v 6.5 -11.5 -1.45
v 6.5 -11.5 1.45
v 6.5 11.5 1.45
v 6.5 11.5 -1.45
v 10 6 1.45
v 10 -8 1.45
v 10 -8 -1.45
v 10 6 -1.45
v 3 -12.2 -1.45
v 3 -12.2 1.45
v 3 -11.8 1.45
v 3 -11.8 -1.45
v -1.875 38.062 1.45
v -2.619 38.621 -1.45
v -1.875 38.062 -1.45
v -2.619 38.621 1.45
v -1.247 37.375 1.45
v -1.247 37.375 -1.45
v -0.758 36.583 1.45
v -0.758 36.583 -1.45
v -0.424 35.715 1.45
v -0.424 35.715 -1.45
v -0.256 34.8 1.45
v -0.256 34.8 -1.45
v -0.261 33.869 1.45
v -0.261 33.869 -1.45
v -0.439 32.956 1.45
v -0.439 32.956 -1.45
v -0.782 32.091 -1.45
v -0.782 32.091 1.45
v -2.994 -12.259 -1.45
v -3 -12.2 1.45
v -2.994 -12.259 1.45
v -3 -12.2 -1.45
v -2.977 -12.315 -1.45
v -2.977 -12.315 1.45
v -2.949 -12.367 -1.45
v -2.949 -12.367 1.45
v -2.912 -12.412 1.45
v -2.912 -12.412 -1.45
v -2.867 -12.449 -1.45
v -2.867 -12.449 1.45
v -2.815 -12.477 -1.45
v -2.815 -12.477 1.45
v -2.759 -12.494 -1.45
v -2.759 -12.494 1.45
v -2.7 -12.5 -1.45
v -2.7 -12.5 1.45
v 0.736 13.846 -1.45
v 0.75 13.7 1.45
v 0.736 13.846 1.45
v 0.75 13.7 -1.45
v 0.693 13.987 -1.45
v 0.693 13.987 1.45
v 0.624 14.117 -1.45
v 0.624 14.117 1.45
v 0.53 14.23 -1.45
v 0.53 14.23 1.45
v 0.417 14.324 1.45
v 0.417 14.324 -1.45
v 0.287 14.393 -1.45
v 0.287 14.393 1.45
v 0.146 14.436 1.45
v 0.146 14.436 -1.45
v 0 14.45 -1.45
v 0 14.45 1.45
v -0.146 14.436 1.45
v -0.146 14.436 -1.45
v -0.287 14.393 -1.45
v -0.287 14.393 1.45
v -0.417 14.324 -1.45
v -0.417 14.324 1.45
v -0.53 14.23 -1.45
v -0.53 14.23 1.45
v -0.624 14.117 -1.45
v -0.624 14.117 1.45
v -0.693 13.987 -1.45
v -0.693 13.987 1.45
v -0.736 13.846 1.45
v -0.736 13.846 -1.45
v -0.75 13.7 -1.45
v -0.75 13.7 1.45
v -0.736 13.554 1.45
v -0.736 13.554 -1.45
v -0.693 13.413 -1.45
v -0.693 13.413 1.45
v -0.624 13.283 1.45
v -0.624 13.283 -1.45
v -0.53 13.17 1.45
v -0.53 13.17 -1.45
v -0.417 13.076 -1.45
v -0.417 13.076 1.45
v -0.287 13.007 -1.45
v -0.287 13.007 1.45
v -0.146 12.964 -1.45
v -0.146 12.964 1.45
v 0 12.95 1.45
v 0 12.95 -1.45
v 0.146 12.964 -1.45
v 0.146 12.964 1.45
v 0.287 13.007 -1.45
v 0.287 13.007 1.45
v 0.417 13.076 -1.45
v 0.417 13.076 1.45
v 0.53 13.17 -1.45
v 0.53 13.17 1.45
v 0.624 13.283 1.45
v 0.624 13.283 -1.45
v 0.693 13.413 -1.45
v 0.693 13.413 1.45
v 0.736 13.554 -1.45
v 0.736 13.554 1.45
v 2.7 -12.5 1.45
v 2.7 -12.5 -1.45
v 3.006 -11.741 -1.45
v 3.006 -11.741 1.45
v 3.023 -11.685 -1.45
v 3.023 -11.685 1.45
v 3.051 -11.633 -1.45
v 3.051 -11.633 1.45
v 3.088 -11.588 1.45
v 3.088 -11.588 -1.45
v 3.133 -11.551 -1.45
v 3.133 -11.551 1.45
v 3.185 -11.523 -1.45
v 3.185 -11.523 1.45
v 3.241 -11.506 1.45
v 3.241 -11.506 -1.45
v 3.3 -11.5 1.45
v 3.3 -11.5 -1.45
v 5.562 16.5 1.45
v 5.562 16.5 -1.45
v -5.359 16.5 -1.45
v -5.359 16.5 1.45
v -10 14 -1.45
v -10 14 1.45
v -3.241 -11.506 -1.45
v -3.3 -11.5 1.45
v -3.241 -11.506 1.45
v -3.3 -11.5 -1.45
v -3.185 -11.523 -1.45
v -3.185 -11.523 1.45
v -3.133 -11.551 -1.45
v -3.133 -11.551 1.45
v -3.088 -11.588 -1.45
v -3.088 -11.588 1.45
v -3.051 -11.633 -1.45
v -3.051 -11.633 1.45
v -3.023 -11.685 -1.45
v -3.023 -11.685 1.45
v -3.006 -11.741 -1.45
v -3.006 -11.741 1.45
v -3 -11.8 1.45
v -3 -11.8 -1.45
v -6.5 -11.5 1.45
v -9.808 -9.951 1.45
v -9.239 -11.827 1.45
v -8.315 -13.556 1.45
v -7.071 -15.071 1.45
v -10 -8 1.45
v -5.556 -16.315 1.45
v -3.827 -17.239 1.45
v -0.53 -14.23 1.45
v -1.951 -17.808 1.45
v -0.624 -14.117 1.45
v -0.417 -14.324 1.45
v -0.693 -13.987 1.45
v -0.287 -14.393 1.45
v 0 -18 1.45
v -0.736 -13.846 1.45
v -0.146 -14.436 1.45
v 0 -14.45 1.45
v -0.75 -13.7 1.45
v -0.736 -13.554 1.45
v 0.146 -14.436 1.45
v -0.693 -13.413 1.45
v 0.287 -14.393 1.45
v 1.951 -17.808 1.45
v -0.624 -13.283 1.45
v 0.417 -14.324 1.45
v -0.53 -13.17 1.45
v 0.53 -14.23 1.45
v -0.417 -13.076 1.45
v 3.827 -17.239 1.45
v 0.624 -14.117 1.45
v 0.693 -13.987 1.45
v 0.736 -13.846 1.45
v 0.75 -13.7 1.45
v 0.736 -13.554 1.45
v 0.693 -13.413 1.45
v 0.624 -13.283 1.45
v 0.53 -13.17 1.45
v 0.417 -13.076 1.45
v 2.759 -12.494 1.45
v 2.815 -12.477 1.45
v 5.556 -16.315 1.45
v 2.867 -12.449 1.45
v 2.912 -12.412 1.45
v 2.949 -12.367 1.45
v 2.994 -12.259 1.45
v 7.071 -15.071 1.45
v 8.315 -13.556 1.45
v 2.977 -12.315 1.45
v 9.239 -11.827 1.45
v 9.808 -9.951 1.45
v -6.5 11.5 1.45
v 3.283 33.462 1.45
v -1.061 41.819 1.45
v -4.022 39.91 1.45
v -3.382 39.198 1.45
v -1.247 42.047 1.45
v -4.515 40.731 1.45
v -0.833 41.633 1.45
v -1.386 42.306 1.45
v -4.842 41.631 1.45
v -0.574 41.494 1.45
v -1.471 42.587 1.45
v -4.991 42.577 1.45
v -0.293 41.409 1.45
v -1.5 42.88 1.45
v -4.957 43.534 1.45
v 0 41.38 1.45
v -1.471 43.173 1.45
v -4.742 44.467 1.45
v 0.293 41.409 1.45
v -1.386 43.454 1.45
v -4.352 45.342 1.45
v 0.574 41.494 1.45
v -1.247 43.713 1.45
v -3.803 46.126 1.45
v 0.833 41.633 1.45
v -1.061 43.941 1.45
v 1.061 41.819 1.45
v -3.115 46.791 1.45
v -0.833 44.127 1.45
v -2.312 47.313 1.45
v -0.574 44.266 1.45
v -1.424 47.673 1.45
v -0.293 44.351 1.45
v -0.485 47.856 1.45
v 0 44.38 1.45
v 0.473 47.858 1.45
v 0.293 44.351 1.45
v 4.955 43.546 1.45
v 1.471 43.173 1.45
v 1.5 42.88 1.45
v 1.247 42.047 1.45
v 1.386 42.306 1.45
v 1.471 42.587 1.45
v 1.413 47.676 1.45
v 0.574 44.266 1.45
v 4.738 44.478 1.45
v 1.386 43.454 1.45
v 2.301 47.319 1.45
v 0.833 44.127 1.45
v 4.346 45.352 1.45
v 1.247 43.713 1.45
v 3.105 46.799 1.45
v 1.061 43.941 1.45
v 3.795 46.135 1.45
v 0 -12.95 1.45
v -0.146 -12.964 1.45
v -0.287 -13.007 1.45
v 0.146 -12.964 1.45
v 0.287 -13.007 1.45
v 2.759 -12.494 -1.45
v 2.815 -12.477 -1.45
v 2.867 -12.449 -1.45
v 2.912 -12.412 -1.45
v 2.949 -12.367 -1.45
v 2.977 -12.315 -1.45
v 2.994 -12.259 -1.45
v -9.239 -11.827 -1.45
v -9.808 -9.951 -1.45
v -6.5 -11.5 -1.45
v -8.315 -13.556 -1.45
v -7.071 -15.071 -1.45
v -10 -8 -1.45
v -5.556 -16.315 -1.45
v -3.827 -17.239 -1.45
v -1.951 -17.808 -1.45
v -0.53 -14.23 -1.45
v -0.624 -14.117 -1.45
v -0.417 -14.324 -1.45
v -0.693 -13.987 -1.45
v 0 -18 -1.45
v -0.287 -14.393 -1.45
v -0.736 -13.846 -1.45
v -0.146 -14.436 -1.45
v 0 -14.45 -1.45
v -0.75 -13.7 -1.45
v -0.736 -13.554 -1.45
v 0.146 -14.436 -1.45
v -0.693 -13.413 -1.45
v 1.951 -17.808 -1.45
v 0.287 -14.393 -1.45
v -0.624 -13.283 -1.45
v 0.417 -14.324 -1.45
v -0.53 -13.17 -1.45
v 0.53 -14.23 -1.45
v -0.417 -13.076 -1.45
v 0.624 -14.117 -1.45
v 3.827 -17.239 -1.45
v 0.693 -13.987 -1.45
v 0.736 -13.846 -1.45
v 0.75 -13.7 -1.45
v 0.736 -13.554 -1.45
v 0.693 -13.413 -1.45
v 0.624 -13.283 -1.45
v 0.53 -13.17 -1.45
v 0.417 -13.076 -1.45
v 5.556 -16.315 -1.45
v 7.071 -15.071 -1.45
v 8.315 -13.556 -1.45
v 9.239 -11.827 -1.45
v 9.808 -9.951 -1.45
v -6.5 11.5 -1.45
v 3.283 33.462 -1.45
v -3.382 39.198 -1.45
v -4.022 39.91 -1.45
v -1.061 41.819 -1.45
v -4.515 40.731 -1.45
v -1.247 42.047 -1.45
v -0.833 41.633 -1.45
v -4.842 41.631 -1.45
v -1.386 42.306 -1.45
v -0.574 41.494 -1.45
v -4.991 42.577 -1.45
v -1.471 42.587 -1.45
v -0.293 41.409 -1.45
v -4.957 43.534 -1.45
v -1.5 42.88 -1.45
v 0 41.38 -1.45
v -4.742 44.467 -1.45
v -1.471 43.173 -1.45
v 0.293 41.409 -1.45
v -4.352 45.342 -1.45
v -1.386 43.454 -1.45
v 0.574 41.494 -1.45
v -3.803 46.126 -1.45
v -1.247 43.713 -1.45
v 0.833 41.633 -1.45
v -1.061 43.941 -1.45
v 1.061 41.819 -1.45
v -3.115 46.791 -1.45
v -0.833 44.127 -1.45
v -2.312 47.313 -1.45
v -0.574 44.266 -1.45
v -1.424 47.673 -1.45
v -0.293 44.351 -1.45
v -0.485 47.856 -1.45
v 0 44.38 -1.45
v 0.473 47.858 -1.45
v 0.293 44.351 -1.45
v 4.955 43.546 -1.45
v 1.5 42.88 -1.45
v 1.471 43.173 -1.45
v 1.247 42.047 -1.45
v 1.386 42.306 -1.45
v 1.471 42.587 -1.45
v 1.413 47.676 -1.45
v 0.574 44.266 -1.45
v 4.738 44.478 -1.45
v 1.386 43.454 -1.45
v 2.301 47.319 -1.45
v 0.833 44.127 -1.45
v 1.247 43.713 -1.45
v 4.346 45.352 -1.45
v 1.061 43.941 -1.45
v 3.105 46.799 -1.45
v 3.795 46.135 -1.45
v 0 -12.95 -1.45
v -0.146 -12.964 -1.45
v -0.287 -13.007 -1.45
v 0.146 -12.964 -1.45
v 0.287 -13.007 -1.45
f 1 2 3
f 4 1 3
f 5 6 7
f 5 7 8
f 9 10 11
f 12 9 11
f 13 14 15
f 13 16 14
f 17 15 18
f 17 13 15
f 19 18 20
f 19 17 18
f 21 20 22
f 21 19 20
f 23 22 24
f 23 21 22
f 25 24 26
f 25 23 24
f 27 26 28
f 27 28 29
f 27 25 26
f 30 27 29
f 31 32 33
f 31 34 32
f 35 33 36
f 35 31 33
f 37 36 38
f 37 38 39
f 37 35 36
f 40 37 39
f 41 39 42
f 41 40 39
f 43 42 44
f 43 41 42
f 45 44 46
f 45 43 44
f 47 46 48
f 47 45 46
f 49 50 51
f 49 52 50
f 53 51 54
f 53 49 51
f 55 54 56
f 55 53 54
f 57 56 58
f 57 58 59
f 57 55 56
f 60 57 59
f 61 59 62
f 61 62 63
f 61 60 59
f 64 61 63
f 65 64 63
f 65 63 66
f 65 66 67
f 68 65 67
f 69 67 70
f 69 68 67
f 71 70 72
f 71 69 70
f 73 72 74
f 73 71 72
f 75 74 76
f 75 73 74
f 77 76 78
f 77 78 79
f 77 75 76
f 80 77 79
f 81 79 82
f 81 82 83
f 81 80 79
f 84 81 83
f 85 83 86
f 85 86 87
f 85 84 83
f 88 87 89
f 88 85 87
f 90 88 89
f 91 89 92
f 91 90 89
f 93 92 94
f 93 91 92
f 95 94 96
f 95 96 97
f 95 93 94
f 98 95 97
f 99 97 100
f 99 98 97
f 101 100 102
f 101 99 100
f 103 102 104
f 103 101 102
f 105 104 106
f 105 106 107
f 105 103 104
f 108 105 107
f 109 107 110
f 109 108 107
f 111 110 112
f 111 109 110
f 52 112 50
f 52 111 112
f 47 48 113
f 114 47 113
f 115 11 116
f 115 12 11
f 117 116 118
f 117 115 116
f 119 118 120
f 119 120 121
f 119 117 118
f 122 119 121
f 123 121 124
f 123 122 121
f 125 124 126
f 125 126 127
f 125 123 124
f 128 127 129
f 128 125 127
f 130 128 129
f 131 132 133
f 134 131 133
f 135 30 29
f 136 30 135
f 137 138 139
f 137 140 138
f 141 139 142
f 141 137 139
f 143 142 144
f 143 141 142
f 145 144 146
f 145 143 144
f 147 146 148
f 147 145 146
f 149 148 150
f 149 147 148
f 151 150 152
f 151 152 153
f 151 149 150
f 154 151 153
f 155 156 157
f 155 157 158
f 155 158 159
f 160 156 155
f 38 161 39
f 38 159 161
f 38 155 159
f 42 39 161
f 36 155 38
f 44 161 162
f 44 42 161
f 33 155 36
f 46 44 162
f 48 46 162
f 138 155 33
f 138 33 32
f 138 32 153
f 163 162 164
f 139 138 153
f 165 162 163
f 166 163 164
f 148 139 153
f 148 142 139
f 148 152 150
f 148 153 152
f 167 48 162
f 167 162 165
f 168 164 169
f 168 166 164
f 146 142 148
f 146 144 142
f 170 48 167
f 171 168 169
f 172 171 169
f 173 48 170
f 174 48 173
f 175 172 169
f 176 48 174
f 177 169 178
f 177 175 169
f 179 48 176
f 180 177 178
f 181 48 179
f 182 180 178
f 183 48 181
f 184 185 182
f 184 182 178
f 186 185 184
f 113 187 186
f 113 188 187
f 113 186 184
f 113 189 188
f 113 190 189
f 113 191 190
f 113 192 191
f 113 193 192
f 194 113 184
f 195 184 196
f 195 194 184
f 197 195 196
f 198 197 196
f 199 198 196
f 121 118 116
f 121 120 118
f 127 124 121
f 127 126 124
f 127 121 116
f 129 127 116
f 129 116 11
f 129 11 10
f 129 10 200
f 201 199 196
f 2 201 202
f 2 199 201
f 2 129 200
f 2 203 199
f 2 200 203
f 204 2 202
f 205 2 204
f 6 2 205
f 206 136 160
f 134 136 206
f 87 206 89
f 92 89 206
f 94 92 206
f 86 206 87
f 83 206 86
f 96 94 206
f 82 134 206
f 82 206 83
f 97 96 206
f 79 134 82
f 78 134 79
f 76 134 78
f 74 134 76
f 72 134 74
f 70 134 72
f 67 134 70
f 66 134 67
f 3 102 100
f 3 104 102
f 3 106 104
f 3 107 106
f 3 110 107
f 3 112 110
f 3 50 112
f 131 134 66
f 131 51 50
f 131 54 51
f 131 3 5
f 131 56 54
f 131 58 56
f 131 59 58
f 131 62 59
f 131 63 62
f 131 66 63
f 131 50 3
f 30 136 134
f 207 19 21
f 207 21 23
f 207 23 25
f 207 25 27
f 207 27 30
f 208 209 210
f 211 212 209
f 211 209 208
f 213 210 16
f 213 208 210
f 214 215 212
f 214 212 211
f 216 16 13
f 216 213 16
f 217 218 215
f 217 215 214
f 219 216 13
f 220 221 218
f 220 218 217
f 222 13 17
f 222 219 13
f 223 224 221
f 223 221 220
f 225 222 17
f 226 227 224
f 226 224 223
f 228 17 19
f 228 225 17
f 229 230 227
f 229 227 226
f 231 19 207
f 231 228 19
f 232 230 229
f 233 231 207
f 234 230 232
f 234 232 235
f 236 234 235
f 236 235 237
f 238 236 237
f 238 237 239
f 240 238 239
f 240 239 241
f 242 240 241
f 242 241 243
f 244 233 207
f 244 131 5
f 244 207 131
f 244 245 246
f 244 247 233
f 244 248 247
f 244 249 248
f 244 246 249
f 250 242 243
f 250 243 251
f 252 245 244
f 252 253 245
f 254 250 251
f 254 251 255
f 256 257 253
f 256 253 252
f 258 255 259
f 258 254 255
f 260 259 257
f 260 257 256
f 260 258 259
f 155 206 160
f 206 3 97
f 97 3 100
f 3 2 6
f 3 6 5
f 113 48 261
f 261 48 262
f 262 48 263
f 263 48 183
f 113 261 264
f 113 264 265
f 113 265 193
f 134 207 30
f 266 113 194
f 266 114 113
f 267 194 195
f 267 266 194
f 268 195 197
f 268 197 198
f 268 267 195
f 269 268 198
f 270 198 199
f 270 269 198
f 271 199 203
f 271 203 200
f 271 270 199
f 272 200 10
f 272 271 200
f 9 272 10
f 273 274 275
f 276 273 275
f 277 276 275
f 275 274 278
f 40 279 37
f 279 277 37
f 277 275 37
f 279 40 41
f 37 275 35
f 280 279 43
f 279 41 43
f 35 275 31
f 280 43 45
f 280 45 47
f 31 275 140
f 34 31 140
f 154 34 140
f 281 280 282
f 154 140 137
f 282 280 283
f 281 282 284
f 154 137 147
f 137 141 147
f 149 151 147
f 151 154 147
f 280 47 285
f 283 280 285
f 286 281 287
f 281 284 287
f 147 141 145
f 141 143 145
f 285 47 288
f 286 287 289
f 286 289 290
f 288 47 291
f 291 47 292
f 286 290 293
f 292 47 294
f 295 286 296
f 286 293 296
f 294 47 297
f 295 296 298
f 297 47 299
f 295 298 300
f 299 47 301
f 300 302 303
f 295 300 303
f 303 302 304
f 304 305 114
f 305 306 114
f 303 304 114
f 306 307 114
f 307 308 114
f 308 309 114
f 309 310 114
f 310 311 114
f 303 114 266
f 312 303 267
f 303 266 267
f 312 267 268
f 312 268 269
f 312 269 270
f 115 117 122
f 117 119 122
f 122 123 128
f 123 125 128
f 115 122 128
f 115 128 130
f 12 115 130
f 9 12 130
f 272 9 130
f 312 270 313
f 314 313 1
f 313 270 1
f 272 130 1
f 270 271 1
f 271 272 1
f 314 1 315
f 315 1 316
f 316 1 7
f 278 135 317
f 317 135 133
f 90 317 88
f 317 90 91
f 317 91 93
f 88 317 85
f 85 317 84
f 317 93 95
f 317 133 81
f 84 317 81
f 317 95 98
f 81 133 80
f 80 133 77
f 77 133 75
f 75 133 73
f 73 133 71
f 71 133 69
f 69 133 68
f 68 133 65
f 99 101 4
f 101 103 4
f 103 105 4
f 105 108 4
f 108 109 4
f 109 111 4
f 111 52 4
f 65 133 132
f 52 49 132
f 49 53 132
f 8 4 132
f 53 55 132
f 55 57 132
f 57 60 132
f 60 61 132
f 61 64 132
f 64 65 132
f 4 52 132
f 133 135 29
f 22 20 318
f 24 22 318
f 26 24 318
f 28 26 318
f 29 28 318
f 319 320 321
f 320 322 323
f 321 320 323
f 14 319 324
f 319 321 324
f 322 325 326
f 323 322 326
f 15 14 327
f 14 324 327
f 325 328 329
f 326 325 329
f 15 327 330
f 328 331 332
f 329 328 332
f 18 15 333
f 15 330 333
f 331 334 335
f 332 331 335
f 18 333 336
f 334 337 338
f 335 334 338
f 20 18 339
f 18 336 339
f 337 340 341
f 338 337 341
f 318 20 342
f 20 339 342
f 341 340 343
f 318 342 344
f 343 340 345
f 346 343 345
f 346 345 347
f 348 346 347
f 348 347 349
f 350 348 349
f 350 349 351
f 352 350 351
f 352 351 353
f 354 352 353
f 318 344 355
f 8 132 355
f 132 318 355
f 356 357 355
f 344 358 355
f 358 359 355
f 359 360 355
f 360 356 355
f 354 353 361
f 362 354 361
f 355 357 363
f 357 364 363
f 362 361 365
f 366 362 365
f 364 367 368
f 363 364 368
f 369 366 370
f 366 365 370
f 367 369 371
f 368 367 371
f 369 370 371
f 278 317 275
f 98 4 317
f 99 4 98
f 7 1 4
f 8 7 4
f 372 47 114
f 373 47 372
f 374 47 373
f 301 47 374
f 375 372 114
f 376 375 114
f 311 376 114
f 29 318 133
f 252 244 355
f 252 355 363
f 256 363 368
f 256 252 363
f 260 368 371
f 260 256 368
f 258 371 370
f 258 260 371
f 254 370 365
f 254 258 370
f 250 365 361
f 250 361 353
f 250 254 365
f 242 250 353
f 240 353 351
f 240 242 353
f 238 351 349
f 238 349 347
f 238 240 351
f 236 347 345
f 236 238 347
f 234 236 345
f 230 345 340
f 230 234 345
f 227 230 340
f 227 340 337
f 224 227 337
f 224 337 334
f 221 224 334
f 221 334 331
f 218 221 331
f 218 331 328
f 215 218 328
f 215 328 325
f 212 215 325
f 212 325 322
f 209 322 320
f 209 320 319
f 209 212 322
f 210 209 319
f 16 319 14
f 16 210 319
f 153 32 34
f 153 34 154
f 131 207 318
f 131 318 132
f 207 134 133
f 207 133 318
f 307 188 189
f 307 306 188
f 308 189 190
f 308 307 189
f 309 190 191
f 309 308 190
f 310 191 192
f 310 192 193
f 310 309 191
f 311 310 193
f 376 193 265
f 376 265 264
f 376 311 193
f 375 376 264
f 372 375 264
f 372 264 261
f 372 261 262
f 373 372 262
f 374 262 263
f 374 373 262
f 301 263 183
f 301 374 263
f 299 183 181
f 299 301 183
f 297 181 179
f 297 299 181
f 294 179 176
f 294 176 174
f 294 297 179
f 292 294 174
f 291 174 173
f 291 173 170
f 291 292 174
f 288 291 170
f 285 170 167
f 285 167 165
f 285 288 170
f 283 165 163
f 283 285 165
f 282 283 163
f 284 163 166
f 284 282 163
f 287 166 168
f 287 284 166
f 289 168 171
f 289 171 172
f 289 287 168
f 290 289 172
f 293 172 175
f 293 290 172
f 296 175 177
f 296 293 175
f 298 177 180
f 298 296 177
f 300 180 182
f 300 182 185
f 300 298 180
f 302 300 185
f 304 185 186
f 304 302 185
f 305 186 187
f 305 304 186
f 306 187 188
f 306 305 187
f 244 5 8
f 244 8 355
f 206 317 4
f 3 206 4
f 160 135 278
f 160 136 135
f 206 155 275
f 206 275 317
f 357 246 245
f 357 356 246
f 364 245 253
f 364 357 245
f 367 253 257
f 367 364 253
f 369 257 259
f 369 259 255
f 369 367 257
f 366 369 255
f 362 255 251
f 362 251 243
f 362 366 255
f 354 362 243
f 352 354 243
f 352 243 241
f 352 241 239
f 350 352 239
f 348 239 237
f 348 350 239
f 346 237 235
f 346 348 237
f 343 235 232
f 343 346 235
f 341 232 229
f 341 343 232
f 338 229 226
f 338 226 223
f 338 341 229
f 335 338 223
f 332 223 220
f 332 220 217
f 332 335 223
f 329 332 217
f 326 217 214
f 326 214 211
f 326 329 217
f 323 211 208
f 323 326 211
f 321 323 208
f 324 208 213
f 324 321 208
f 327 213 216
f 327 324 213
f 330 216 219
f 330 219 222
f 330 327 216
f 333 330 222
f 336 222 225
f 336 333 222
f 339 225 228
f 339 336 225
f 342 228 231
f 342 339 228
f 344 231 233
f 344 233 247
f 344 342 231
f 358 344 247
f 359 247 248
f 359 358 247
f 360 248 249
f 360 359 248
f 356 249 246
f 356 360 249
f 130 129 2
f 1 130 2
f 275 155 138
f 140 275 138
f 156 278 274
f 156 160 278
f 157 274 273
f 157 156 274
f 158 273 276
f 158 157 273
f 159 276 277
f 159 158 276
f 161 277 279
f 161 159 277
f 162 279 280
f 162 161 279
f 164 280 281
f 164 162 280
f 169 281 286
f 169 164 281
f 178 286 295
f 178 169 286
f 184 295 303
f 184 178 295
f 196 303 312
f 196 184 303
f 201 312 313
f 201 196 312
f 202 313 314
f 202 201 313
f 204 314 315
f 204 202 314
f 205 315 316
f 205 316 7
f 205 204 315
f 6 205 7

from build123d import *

# Parameters (mm, degrees)
SKETCH_1_R          = 0.75
SKETCH_1_W          = 13
SKETCH_1_H          = 23
SKETCH_1_R_2        = 1.5
EXTRUDE_1_DEPTH     = 1.45
SKETCH_2_W          = 6
SKETCH_2_H          = 1
CUT_EXTRUDE_1_DEPTH = 3
FILLET_1_R          = 0.3


with BuildPart() as part:
    # 草图1 → 凸台-拉伸1 (new body, symmetric)
    with BuildSketch(Plane.XY):
        with BuildLine():
            ThreePointArc((-10, -8), (0, -18), (10, -8))
            Line((10, -8), (10, 6))
            Line((10, 6), (4.955472685, 43.54580062))
            ThreePointArc((4.955472685, 43.54580062), (-2.725773115, 47.071677579), (-2.618575221, 38.62053245))
            ThreePointArc((-2.618575221, 38.62053245), (-0.423906888, 35.714832413), (-0.782117822, 32.091112401))
            Line((-0.782117822, 32.091112401), (-10, 14))
            Line((-10, 14), (-10, -8))
        make_face()
        with Locations((0, -13.7)):
            Circle(SKETCH_1_R, mode=Mode.SUBTRACT)
        Rectangle(SKETCH_1_W, SKETCH_1_H, mode=Mode.SUBTRACT)
        with Locations((0, 13.7)):
            Circle(SKETCH_1_R, mode=Mode.SUBTRACT)
        with Locations((0, 42.88)):
            Circle(SKETCH_1_R_2, mode=Mode.SUBTRACT)
        Polygon((5.562298916, 16.5), (-5.359207663, 16.5), (3.283346167, 33.461966942), align=None, mode=Mode.SUBTRACT)
    extrude(amount=EXTRUDE_1_DEPTH, both=True)

    # 草图2 → 切除-拉伸1 (cut)
    with BuildSketch(Plane.XY.offset(1.45)):
        with Locations((0, -12)):
            Rectangle(SKETCH_2_W, SKETCH_2_H)
    extrude(amount=-CUT_EXTRUDE_1_DEPTH, mode=Mode.SUBTRACT)

    # 圆角1
    fillet_1_edges = [part.edges().sort_by_distance(p)[0] for p in [
        (-3, -11.5, 0),
        (3, -11.5, 0),
        (3, -12.5, 0),
        (-3, -12.5, 0),
    ]]
    fillet(fillet_1_edges, radius=FILLET_1_R)


solid = part.part
